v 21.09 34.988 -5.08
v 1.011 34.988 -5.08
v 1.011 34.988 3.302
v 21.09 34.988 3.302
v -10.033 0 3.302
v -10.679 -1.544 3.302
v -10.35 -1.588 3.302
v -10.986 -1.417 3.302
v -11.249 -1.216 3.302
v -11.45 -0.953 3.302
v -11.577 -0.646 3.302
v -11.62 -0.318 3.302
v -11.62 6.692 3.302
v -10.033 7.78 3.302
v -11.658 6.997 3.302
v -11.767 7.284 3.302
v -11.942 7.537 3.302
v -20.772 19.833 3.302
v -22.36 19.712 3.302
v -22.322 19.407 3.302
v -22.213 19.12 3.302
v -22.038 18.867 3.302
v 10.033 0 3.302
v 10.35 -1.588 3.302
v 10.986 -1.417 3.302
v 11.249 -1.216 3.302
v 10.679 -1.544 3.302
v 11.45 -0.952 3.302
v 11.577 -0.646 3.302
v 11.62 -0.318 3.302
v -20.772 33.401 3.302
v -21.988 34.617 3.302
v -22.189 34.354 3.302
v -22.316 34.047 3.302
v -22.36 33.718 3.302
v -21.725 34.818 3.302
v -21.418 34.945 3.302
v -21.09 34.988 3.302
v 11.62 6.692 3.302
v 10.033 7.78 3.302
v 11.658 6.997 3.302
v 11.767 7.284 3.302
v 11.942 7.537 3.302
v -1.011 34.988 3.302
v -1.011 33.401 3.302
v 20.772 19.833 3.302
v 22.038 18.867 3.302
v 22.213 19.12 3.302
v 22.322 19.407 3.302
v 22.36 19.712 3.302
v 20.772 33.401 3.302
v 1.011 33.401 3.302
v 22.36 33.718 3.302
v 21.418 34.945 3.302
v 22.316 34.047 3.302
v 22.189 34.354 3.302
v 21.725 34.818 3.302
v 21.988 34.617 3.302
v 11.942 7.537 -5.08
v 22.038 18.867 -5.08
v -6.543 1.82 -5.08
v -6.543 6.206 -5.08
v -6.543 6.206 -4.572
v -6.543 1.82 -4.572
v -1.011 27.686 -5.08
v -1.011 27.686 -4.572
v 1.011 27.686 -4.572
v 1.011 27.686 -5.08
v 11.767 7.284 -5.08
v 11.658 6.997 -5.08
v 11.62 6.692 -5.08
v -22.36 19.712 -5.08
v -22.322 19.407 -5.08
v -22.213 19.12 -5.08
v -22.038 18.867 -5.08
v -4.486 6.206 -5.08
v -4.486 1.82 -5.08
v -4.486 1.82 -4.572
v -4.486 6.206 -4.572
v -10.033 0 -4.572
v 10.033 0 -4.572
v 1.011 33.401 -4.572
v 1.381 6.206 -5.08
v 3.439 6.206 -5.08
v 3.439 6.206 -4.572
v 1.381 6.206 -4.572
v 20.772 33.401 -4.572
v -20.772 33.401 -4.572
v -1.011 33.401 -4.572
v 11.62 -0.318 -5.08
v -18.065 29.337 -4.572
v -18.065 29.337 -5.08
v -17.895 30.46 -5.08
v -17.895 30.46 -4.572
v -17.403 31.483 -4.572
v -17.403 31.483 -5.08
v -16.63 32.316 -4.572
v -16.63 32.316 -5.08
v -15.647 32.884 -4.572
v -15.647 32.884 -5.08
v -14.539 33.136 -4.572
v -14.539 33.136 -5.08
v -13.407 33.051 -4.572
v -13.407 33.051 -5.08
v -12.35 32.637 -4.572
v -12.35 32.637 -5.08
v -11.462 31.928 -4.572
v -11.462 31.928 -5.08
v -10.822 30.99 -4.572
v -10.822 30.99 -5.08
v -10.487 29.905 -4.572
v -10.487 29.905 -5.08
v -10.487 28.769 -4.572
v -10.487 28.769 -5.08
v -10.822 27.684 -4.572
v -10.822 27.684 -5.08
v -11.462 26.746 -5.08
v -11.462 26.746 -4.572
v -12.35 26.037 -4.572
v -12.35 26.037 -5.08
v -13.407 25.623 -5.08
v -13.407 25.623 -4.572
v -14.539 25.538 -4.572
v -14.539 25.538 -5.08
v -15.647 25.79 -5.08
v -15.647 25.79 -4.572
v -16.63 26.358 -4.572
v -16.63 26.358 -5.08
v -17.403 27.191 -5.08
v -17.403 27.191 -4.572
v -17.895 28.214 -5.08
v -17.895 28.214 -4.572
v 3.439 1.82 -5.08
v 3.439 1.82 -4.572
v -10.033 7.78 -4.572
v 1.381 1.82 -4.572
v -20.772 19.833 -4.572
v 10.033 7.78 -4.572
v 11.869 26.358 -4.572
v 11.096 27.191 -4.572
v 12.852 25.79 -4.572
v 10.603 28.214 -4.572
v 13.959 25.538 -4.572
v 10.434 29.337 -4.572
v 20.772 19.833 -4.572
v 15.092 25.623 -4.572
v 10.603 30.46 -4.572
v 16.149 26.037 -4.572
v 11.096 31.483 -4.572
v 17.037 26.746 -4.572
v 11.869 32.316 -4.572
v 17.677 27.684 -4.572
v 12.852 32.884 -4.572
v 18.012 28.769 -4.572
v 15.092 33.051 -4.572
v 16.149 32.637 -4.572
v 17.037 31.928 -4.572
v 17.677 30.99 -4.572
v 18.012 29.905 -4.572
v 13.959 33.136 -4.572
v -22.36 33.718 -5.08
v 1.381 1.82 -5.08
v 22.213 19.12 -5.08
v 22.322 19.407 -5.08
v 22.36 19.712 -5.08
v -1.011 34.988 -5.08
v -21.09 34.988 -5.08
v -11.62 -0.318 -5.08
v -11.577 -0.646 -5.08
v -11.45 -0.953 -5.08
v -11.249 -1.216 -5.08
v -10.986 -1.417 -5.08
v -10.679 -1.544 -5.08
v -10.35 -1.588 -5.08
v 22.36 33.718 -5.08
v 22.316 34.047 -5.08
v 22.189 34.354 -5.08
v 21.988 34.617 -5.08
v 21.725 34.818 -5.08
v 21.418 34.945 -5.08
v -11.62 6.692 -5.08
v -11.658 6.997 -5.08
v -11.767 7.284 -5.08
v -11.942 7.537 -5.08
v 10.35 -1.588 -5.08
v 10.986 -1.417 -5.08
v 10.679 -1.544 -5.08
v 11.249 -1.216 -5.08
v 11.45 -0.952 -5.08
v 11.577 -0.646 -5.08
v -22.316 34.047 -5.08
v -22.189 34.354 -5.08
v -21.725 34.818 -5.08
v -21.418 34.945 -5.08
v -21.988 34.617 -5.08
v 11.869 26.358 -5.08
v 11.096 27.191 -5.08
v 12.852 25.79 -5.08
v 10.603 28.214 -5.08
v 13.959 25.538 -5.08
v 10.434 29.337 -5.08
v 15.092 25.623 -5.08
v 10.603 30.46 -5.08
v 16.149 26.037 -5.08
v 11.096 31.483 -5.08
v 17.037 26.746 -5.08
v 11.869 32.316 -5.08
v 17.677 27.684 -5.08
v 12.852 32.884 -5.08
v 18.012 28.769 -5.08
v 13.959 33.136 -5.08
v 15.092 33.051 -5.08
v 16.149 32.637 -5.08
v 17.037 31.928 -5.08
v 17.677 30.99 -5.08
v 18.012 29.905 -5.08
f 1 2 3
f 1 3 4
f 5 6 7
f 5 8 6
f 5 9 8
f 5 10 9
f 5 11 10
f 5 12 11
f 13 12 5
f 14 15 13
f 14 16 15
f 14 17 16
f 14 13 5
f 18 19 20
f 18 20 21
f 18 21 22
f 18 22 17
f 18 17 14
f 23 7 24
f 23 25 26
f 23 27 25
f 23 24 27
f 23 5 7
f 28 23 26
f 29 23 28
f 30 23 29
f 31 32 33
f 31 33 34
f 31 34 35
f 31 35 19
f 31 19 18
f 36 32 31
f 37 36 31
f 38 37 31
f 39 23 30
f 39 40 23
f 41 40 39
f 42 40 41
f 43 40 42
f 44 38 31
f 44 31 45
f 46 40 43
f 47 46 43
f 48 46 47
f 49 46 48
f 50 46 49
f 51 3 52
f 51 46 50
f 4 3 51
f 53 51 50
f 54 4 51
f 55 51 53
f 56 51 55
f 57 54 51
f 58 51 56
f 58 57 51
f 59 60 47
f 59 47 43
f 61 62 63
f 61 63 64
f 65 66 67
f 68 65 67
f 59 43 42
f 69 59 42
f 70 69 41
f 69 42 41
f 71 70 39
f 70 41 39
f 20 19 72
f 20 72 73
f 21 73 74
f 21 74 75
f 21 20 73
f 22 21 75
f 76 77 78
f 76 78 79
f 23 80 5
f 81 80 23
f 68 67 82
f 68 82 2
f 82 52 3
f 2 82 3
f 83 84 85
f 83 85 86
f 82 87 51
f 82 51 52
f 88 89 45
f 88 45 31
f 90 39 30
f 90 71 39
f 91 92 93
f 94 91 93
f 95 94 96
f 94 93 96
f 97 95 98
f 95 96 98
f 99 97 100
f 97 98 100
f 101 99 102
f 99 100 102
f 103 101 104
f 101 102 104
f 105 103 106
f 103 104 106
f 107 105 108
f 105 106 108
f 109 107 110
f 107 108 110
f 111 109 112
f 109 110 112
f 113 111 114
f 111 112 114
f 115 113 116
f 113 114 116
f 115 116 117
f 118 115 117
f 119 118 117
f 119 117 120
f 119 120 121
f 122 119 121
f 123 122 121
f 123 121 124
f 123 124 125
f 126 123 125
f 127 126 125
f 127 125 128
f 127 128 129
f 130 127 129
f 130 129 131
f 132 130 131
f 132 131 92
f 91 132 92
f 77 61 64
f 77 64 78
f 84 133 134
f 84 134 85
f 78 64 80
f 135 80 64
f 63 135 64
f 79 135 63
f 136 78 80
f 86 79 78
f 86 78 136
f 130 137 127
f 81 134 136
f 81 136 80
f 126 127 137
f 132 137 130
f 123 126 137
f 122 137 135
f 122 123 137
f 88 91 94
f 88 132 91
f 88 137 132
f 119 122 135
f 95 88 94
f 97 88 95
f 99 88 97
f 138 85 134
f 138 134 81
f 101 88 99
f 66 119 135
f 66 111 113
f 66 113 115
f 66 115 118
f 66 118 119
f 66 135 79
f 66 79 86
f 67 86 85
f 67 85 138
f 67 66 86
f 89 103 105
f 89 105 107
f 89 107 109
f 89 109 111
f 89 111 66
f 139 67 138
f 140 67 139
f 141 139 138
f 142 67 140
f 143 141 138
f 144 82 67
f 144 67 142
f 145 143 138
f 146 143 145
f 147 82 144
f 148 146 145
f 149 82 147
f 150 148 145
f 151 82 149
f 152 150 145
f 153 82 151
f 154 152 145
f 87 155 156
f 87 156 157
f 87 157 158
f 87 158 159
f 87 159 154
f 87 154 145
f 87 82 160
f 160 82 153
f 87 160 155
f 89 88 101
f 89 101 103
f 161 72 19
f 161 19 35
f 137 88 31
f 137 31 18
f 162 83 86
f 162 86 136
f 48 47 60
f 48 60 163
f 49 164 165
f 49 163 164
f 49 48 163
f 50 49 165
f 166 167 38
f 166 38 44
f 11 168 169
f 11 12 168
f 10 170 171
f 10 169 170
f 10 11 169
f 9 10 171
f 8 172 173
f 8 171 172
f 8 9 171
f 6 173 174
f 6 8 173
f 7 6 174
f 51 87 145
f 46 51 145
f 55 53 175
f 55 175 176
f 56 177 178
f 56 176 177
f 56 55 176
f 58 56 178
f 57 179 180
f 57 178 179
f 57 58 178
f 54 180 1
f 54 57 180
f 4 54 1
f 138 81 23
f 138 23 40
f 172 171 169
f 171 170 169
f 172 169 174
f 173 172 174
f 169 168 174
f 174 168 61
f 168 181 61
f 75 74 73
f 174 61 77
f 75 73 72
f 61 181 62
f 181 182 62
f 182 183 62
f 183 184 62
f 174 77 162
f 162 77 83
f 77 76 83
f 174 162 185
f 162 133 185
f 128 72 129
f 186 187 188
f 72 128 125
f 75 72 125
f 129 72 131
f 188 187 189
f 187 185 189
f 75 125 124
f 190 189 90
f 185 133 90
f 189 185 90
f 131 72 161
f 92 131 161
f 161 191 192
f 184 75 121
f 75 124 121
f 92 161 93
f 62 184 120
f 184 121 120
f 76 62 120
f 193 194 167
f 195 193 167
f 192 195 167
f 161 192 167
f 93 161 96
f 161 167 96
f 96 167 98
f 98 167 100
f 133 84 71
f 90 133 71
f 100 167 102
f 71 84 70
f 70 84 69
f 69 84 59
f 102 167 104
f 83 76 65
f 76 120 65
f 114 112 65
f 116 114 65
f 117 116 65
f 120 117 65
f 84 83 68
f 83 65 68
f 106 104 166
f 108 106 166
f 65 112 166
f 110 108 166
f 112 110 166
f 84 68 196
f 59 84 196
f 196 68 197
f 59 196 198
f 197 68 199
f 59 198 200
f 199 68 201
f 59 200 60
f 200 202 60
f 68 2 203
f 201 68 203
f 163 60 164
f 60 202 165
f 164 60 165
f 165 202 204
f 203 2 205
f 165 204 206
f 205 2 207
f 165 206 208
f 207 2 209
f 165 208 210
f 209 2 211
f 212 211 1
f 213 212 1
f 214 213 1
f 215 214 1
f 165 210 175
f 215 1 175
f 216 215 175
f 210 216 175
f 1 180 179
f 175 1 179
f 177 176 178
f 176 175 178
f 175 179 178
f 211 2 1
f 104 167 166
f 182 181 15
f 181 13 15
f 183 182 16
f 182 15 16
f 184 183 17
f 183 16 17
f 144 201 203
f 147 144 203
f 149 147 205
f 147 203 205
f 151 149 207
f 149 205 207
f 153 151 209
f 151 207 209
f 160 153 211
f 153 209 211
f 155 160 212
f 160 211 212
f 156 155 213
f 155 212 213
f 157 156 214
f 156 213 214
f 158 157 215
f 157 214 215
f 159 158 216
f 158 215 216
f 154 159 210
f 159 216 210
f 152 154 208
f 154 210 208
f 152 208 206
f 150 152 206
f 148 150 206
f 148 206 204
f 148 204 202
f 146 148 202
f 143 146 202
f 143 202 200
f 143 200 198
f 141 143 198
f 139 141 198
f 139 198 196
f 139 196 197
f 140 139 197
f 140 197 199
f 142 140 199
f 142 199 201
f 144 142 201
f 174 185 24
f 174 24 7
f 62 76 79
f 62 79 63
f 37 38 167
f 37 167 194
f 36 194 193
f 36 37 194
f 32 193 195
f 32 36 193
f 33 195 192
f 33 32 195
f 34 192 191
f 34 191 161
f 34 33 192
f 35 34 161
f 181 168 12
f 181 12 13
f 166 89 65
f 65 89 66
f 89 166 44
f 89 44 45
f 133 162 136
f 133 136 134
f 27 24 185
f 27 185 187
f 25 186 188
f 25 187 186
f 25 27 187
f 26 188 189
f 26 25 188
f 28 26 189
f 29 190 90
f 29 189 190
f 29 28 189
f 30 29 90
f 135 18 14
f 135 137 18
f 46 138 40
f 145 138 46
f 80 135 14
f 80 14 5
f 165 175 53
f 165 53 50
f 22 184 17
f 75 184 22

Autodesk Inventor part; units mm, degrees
ref_plane "YZ Plane" through (0, 0, 0) normal (1, 0, 0) x (0, 1, 0)
ref_plane "XZ Plane" through (0, 0, 0) normal (0, 1, 0) x (-1, 0, 0)
ref_plane "Work Plane1" through (0, 0, -5.08) normal (0, 0, 1) x (1, 0, 0)
sketch "Sketch1" plane through (0, 0, -5.08) normal (0, 0, 1) x (1, 0, 0)
  line L0 (20.772, 33.401) -> (20.772, 19.8332)
  line L1 (20.772, 33.401) -> (1.011, 33.401)
  line L2 (1.011, 33.401) -> (1.011, 27.686)
  line L3 (1.011, 27.686) -> (-1.011, 27.686)
  line L4 (-1.011, 27.686) -> (-1.011, 33.401)
  line L5 (-1.011, 33.401) -> (-20.772, 33.401)
  line L6 (-20.772, 33.401) -> (-20.772, 19.8332)
  line L7 (-20.772, 19.8332) -> (-10.033, 7.78)
  line L8 (-10.033, 7.78) -> (-10.033, 0)
  line L9 (-10.033, 0) -> (10.033, 0)
  line L10 (10.033, 0) -> (10.033, 7.78)
  line L11 (10.033, 7.78) -> (20.772, 19.8332)
  line L12 (-22.3595, 34.9885) -> (-0.5765, 34.9885)
  line L13 (-0.5765, 34.9885) -> (22.3595, 34.9885)
  line L14 (22.3595, 34.9885) -> (22.3595, 19.2286)
  line L15 (22.3595, 19.2286) -> (11.6205, 7.1754)
  line L16 (11.6205, 7.1754) -> (11.6205, -1.5875)
  line L17 (11.6205, -1.5875) -> (-11.6205, -1.5875)
  line L18 (-11.6205, -1.5875) -> (-11.6205, 7.1754)
  line L19 (-11.6205, 7.1754) -> (-22.3595, 19.2286)
  line L20 (-22.3595, 19.2286) -> (-22.3595, 34.9885)
  point P0 (0, 0)
  point P1 (0, 0)
  point P2 (0, 27.686)
  point P3 (0, 0)
  dimension "d1" = 41.544
  dimension "d2" = 19.761
  dimension "d3" = 19.761
  dimension "d6" = 20.066
  dimension "d7" = 138.3
  dimension "d8" = 138.3
  dimension "d9" = 33.401
  dimension "d10" = 5.715
  dimension "d11" = 25.621
  dimension "d12" = 1.5875
extrude "Extrusion1" add sketch "Sketch1" along normal blind 8.382
extrude "Extrusion2" add sketch "Sketch1" along normal blind 0.508 contours L0 L11 L10 L9 L8 L7 L6 L5 L4 L3 L2 L1
sketch "Sketch2" plane through (0, 0, 3.302) normal (0, 0, 1) x (1, 0, 0)
  line L0 (-22.3595, 34.9885) -> (22.3595, 34.9885) construction
  line L1 (-1.011, 27.686) -> (1.011, 27.686)
  line L2 (1.011, 27.686) -> (1.011, 34.9885)
  line L3 (1.011, 34.9885) -> (-1.011, 34.9885)
  line L4 (-1.011, 34.9885) -> (-1.011, 27.686)
  point P0 (0, 0)
extrude "Extrusion3" cut sketch "Sketch2" against normal through all
fillet "Fillet1" radius 1.27 8 edges at (-22.3595, 34.9885, -0.889) (-22.3595, 19.2286, -0.889) (-11.6205, 7.1754, -0.889) (-11.6205, -1.5875, -0.889) (11.6205, -1.5875, -0.889) (11.6205, 7.1754, -0.889) (22.3595, 19.2286, -0.889) (22.3595, 34.9885, -0.889)
sketch "Sketch4" plane through (0, 0, -5.08) normal (0, 0, -1) x (-1, 0, 0)
  circle A0 centre (-14.2442, 29.337) radius 1.8288 construction
  circle A1 centre (14.2546, 29.337) radius 1.8288 construction
  circle A2 centre (-14.2442, 29.337) radius 3.81
  circle A3 centre (14.2546, 29.337) radius 3.81
  line L0 (-1.8894, 5.6982) -> (-2.9308, 5.6982) construction
  line L1 (-2.9308, 2.3282) -> (-2.9308, 5.6982) construction
  line L2 (-2.9308, 2.3282) -> (-1.8894, 2.3282) construction
  line L3 (-1.8894, 5.6982) -> (-1.8894, 2.3282) construction
  line L4 (6.0354, 5.6982) -> (4.994, 5.6982) construction
  line L5 (4.994, 2.3282) -> (4.994, 5.6982) construction
  line L6 (4.994, 2.3282) -> (6.0354, 2.3282) construction
  line L7 (6.0354, 5.6982) -> (6.0354, 2.3282) construction
  line L8 (-1.3814, 1.8202) -> (-3.4388, 1.8202)
  line L9 (-3.4388, 1.8202) -> (-3.4388, 6.2062)
  line L10 (-3.4388, 6.2062) -> (-1.3814, 6.2062)
  line L11 (-1.3814, 6.2062) -> (-1.3814, 1.8202)
  line L12 (4.486, 6.2062) -> (6.5434, 6.2062)
  line L13 (6.5434, 6.2062) -> (6.5434, 1.8202)
  line L14 (6.5434, 1.8202) -> (4.486, 1.8202)
  line L15 (4.486, 1.8202) -> (4.486, 6.2062)
  point P0 (0, 0)
  dimension "d30" = 7.62
  dimension "d33" = 0.508
  dimension "d34" = 0.508
extrude "Extrusion4" cut sketch "Sketch4" against normal blind 25.4
equation "\"d3\" = d2"
equation "\"d8\" = d7"
properties part number "kracken Cover" material "Aluminum 6061"
